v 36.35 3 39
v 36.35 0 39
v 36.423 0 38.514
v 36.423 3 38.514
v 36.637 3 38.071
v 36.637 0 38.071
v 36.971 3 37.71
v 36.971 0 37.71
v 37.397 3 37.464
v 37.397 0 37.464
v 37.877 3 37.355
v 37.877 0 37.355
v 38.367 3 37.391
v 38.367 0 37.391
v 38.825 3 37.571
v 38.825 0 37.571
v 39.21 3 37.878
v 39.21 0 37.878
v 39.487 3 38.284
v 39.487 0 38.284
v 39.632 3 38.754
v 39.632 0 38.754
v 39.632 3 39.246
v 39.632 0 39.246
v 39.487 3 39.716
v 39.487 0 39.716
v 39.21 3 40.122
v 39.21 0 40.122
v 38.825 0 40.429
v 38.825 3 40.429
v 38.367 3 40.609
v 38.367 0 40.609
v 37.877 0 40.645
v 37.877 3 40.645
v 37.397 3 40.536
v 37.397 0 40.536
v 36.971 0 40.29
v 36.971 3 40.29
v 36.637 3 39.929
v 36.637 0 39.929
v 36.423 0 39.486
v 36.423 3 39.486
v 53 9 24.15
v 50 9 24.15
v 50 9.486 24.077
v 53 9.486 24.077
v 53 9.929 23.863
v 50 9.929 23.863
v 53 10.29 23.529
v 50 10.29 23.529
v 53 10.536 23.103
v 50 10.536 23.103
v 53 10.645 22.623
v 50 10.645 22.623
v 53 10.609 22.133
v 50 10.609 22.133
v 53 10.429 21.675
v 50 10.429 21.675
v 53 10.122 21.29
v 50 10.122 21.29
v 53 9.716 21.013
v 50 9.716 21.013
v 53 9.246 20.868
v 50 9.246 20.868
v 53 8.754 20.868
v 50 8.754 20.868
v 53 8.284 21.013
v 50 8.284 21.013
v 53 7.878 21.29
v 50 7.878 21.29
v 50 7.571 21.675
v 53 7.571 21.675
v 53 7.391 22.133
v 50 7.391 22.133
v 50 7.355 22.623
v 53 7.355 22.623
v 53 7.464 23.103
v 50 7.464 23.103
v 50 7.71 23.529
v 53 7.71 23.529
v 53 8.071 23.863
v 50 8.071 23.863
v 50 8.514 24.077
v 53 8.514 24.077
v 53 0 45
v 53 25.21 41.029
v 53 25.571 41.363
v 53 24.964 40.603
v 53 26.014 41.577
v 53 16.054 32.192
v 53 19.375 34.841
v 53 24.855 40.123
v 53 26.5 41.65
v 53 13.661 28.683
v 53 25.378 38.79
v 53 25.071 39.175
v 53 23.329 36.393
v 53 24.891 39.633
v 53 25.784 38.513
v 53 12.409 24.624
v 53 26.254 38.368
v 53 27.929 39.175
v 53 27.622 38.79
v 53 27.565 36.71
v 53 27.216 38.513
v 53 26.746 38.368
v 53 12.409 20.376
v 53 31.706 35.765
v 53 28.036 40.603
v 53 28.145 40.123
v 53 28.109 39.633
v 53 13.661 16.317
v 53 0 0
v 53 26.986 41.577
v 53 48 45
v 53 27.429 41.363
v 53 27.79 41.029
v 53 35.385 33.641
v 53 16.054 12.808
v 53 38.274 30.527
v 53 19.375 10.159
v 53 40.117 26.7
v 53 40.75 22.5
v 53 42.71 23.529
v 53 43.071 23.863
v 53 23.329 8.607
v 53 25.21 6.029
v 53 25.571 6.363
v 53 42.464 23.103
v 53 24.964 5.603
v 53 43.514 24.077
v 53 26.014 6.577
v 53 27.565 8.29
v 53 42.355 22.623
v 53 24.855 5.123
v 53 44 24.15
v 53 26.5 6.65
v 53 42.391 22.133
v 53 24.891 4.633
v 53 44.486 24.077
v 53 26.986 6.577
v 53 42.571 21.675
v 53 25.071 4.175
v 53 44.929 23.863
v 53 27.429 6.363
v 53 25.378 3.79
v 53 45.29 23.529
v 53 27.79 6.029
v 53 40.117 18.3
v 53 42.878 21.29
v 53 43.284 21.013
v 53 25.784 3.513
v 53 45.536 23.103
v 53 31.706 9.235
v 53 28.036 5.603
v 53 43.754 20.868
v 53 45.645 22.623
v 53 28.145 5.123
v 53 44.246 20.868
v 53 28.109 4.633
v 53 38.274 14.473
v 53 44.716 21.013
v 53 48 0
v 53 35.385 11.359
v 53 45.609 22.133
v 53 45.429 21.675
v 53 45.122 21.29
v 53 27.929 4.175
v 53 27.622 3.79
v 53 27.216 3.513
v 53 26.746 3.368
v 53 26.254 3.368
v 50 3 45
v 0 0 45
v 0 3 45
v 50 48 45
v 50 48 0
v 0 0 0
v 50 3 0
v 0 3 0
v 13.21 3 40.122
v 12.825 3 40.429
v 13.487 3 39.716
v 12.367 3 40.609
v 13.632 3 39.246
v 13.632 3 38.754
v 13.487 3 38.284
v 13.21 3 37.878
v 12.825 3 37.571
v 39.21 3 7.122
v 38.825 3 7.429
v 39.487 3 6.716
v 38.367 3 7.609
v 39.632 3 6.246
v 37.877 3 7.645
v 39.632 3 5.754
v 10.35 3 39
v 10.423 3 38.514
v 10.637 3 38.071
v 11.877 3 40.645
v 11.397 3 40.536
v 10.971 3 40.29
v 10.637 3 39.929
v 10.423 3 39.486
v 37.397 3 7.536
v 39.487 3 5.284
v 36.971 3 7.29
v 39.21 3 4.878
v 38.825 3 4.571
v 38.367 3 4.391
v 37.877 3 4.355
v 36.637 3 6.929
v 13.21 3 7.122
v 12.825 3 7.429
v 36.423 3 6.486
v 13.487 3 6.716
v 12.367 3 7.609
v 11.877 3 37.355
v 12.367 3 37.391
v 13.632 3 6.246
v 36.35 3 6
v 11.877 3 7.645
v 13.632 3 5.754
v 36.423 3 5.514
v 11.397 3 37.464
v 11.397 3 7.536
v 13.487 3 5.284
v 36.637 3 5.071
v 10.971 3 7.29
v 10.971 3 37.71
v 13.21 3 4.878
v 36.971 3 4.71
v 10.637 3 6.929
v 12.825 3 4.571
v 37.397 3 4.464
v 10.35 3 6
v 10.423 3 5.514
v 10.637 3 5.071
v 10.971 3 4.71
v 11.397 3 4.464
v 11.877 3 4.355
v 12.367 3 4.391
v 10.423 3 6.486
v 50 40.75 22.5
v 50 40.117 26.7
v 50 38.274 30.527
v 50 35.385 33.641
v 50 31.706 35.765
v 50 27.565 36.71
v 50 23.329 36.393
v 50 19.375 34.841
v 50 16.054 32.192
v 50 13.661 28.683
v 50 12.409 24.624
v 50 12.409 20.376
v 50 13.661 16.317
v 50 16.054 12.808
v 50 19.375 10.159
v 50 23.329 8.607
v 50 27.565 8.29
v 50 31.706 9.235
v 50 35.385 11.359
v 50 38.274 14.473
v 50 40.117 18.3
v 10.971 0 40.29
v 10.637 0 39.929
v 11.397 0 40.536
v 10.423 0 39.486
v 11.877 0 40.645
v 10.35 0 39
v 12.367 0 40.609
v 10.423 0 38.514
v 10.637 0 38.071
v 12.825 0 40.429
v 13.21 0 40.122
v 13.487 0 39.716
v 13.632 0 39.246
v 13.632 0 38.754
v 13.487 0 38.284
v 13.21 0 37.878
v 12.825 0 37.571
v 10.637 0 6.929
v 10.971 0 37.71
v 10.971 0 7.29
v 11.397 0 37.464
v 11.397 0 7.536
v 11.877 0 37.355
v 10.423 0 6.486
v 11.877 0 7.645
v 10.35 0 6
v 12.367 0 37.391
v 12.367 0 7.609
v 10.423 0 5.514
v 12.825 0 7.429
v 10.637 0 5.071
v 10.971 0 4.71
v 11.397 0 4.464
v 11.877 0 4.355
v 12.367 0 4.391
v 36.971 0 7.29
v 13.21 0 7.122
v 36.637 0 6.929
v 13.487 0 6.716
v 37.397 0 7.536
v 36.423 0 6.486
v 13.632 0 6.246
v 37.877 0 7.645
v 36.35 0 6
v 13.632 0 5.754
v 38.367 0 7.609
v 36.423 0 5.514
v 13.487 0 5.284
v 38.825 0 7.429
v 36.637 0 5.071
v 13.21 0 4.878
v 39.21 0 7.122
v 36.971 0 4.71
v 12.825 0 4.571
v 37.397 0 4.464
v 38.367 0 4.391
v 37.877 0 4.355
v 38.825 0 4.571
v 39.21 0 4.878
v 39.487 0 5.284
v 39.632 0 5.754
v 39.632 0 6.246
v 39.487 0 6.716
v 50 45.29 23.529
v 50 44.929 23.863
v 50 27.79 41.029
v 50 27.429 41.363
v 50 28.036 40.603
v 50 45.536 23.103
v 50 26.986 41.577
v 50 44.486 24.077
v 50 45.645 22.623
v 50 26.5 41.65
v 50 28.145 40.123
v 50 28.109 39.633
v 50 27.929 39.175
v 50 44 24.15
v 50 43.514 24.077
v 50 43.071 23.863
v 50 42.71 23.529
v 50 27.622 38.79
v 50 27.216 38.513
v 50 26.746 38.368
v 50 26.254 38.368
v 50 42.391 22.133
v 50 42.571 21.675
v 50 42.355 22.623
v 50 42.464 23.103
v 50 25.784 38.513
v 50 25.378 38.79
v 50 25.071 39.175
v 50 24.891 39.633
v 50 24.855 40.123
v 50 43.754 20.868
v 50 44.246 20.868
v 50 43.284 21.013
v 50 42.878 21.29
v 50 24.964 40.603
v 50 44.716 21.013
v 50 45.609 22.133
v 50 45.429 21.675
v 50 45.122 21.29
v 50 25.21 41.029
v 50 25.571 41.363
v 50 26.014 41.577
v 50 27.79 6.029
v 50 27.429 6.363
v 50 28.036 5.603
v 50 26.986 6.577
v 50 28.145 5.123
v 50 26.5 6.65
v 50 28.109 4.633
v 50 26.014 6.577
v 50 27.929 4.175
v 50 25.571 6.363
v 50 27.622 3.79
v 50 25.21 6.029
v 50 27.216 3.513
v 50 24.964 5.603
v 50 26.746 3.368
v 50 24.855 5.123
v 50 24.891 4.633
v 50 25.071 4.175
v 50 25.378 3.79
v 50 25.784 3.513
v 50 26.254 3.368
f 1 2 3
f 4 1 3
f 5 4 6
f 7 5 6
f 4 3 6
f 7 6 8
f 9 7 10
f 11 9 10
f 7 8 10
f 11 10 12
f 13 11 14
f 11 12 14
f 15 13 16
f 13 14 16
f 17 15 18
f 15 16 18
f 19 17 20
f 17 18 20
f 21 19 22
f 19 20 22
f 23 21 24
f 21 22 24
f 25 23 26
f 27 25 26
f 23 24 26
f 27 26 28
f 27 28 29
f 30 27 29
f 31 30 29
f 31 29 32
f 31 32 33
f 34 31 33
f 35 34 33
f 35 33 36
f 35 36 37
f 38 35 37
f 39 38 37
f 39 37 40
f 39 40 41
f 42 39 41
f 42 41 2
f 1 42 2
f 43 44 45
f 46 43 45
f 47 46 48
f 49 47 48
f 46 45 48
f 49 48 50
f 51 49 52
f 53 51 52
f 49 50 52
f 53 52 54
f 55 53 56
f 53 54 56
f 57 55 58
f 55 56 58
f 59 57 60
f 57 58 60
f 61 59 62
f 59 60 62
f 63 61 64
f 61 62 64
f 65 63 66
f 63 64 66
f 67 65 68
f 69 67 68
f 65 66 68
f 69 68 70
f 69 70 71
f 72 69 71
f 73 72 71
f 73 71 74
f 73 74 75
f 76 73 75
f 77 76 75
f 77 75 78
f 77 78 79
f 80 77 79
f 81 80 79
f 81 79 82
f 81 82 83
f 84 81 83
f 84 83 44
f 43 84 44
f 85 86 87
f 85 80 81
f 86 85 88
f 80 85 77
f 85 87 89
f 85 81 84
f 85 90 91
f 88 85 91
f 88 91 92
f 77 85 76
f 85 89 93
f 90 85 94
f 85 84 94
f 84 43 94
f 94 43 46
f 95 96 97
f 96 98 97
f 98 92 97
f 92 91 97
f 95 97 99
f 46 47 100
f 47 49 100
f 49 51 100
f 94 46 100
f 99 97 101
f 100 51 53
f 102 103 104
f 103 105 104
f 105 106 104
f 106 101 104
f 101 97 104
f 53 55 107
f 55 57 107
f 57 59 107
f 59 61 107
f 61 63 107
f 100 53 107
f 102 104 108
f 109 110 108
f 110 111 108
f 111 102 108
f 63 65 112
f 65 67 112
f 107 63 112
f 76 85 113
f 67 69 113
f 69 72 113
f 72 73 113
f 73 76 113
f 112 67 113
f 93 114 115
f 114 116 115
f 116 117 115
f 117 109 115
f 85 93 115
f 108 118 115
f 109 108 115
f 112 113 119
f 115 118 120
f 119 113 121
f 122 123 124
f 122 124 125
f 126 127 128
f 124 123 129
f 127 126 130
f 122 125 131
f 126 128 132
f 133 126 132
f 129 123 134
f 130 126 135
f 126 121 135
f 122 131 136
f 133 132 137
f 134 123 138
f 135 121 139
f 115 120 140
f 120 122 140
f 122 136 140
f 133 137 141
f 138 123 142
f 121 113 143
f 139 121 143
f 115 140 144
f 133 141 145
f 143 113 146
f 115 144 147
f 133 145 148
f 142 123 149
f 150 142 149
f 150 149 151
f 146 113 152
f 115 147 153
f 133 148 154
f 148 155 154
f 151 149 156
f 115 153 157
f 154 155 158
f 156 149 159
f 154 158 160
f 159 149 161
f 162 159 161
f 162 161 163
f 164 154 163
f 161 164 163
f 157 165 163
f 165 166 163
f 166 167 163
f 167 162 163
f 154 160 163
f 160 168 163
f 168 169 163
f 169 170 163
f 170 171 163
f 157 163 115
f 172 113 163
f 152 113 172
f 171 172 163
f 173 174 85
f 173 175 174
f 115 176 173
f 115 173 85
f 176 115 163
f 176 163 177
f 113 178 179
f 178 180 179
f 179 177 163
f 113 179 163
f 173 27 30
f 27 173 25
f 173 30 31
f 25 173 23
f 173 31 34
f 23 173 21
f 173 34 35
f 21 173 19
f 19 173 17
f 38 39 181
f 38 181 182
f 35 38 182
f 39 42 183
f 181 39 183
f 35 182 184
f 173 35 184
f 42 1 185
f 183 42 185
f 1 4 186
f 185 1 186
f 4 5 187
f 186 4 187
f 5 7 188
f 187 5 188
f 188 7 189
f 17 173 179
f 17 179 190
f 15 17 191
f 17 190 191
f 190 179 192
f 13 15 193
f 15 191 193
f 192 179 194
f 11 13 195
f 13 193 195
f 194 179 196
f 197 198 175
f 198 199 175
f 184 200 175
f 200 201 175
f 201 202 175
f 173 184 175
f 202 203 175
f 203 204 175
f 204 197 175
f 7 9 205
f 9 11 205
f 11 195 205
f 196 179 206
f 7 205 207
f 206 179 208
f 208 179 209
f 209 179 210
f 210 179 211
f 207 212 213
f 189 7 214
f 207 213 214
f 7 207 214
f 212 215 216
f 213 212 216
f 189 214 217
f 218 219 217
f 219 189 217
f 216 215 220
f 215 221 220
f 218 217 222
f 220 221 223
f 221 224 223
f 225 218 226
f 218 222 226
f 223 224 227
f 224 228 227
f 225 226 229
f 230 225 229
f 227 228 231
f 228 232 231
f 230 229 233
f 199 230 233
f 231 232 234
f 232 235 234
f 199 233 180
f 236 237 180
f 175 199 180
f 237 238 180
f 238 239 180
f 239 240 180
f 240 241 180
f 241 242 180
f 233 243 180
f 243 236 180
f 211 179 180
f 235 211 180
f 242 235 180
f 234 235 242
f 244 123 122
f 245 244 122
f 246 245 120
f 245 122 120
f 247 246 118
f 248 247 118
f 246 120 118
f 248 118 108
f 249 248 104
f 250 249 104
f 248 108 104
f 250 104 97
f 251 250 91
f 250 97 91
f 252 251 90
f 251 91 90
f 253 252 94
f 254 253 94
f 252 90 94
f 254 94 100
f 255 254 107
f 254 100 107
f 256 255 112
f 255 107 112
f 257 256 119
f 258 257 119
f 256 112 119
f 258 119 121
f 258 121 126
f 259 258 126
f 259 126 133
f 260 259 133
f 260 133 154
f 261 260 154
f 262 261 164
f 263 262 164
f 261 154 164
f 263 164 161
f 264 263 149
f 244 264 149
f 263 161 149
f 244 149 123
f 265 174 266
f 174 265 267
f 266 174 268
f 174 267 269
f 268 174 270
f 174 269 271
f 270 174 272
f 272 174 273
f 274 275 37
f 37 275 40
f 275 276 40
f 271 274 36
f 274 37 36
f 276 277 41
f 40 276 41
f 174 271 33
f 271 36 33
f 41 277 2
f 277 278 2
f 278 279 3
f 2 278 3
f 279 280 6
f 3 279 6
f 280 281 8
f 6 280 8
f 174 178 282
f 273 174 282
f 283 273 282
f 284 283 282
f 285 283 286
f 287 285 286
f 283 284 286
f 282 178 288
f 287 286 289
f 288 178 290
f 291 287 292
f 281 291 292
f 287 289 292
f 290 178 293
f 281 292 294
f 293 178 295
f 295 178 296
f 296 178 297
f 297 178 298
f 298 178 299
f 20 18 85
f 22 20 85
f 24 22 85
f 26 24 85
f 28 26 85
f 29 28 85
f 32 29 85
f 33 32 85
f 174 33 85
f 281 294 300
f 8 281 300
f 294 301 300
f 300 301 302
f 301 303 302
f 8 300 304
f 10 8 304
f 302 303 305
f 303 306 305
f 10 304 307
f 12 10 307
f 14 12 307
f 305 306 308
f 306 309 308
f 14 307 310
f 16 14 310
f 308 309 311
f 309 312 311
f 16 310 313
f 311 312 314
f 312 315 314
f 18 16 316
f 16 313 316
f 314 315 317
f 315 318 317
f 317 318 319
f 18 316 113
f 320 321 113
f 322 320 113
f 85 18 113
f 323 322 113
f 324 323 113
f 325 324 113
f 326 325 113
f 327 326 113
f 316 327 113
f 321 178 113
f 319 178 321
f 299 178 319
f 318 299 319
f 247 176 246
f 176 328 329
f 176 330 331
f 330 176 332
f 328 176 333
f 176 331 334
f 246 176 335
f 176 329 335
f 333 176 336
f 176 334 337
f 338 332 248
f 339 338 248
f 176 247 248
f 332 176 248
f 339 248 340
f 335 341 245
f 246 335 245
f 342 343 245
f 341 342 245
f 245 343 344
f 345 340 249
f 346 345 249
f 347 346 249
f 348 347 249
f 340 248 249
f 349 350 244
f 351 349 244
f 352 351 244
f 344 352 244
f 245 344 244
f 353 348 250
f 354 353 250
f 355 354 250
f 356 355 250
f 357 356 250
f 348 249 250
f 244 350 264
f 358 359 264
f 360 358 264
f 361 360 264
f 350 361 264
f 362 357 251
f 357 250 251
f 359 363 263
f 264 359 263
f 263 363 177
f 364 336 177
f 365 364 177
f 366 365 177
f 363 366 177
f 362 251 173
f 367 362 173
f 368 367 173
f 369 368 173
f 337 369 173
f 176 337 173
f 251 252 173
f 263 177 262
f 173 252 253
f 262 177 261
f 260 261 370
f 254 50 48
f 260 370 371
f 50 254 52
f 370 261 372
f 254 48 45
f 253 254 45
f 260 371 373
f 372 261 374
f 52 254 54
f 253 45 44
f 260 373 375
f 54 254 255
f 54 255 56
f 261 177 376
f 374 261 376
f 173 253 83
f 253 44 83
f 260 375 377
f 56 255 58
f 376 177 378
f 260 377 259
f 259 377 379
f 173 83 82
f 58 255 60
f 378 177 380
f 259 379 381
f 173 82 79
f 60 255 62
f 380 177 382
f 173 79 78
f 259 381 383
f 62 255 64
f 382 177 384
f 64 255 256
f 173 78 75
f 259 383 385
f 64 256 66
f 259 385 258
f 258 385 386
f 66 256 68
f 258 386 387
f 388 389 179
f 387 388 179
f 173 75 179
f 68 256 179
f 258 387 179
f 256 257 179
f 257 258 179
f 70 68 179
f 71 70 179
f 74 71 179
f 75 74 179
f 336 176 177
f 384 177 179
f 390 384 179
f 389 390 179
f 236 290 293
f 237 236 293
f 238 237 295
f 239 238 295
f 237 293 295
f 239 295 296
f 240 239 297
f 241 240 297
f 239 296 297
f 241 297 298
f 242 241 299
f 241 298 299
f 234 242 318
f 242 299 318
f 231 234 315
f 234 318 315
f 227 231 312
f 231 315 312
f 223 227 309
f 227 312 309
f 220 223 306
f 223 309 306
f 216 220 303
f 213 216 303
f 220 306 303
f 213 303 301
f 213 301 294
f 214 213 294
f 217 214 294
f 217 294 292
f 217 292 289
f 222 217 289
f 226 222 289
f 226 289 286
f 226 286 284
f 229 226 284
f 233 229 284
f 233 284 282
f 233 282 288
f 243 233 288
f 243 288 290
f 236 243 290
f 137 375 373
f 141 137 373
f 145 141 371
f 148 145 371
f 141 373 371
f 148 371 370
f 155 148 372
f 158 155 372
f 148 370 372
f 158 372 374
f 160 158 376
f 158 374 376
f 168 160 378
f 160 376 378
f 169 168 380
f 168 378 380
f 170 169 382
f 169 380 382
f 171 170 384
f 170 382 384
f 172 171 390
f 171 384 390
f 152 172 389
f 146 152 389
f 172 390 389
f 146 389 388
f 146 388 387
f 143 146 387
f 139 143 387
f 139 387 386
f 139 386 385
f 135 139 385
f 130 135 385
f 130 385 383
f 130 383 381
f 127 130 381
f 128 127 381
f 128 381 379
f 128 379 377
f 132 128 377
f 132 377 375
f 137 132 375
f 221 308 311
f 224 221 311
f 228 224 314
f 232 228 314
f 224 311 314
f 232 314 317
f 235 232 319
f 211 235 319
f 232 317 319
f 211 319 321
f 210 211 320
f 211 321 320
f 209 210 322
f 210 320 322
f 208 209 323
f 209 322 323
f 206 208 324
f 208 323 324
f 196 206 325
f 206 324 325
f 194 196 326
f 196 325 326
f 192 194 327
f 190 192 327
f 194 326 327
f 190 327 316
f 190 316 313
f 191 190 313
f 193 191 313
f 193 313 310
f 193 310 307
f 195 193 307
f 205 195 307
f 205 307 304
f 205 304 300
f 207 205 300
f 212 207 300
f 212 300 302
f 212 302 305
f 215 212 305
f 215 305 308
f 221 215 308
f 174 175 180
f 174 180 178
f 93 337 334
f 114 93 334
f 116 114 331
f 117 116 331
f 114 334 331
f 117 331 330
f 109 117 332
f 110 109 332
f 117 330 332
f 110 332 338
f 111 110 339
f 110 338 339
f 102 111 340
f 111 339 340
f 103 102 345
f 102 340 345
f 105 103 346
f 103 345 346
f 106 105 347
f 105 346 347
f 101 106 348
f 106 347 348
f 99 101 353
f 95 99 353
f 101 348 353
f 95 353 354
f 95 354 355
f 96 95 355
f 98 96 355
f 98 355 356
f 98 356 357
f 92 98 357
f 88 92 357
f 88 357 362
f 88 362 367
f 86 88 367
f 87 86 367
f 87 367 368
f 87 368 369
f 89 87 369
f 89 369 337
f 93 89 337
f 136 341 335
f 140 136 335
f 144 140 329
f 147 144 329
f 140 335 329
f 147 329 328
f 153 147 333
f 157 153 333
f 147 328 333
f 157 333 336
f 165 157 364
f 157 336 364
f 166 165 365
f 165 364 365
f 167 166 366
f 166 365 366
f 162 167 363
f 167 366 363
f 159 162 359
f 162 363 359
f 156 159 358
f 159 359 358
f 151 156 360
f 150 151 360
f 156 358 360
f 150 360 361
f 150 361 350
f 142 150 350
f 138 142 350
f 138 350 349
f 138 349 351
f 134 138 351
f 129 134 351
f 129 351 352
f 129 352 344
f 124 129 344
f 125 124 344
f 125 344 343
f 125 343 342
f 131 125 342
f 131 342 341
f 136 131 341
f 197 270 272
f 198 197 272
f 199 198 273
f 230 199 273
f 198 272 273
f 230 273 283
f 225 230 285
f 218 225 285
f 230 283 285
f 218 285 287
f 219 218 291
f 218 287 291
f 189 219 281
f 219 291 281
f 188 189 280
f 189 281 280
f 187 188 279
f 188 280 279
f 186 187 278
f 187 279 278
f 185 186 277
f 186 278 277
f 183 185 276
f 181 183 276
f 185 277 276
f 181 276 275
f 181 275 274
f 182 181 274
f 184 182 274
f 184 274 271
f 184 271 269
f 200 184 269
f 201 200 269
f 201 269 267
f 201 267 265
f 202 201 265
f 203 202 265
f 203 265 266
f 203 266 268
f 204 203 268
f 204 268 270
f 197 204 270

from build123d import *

# Parameters (mm, degrees)
BOSS_EXTRUDE1_DEPTH = 45
M4_TAPPED_HOLE12_D  = 3.3
M4_TAPPED_HOLE13_D  = 3.3
SKETCH23_R          = 14.25
CUT_EXTRUDE5_DEPTH  = 3


with BuildPart() as part:
    # Sketch1 → Boss-Extrude1 (new body)
    with BuildSketch(Plane.XY):
        Polygon((0, 0), (53, 0), (53, 48), (50, 48), (50, 3), (0, 3), align=None)
    extrude(amount=BOSS_EXTRUDE1_DEPTH)

    # M4 Tapped Hole12 (through all)
    with Locations(Plane(origin=(0, 3, 0), x_dir=(1, 0, 0), z_dir=(0, 1, 0))):
        with Locations((38, -39), (12, -39), (12, -6), (38, -6)):
            Hole(M4_TAPPED_HOLE12_D / 2)

    # M4 Tapped Hole13 (through all)
    with Locations(Plane(origin=(53, 0, 0), x_dir=(0, 0, -1), z_dir=(1, 0, 0))):
        with Locations((-22.5, 44), (-5, 26.5), (-22.5, 9), (-40, 26.5)):
            Hole(M4_TAPPED_HOLE13_D / 2)

    # Sketch23 → Cut-Extrude5 (cut)
    with BuildSketch(Plane(origin=(53, 0, 0), x_dir=(0, 0, -1), z_dir=(1, 0, 0))):
        with Locations(Location((-22.5, 26.5, 0), (0, 0, 90))):
            Circle(SKETCH23_R)
    extrude(amount=-CUT_EXTRUDE5_DEPTH, mode=Mode.SUBTRACT)


solid = part.part
